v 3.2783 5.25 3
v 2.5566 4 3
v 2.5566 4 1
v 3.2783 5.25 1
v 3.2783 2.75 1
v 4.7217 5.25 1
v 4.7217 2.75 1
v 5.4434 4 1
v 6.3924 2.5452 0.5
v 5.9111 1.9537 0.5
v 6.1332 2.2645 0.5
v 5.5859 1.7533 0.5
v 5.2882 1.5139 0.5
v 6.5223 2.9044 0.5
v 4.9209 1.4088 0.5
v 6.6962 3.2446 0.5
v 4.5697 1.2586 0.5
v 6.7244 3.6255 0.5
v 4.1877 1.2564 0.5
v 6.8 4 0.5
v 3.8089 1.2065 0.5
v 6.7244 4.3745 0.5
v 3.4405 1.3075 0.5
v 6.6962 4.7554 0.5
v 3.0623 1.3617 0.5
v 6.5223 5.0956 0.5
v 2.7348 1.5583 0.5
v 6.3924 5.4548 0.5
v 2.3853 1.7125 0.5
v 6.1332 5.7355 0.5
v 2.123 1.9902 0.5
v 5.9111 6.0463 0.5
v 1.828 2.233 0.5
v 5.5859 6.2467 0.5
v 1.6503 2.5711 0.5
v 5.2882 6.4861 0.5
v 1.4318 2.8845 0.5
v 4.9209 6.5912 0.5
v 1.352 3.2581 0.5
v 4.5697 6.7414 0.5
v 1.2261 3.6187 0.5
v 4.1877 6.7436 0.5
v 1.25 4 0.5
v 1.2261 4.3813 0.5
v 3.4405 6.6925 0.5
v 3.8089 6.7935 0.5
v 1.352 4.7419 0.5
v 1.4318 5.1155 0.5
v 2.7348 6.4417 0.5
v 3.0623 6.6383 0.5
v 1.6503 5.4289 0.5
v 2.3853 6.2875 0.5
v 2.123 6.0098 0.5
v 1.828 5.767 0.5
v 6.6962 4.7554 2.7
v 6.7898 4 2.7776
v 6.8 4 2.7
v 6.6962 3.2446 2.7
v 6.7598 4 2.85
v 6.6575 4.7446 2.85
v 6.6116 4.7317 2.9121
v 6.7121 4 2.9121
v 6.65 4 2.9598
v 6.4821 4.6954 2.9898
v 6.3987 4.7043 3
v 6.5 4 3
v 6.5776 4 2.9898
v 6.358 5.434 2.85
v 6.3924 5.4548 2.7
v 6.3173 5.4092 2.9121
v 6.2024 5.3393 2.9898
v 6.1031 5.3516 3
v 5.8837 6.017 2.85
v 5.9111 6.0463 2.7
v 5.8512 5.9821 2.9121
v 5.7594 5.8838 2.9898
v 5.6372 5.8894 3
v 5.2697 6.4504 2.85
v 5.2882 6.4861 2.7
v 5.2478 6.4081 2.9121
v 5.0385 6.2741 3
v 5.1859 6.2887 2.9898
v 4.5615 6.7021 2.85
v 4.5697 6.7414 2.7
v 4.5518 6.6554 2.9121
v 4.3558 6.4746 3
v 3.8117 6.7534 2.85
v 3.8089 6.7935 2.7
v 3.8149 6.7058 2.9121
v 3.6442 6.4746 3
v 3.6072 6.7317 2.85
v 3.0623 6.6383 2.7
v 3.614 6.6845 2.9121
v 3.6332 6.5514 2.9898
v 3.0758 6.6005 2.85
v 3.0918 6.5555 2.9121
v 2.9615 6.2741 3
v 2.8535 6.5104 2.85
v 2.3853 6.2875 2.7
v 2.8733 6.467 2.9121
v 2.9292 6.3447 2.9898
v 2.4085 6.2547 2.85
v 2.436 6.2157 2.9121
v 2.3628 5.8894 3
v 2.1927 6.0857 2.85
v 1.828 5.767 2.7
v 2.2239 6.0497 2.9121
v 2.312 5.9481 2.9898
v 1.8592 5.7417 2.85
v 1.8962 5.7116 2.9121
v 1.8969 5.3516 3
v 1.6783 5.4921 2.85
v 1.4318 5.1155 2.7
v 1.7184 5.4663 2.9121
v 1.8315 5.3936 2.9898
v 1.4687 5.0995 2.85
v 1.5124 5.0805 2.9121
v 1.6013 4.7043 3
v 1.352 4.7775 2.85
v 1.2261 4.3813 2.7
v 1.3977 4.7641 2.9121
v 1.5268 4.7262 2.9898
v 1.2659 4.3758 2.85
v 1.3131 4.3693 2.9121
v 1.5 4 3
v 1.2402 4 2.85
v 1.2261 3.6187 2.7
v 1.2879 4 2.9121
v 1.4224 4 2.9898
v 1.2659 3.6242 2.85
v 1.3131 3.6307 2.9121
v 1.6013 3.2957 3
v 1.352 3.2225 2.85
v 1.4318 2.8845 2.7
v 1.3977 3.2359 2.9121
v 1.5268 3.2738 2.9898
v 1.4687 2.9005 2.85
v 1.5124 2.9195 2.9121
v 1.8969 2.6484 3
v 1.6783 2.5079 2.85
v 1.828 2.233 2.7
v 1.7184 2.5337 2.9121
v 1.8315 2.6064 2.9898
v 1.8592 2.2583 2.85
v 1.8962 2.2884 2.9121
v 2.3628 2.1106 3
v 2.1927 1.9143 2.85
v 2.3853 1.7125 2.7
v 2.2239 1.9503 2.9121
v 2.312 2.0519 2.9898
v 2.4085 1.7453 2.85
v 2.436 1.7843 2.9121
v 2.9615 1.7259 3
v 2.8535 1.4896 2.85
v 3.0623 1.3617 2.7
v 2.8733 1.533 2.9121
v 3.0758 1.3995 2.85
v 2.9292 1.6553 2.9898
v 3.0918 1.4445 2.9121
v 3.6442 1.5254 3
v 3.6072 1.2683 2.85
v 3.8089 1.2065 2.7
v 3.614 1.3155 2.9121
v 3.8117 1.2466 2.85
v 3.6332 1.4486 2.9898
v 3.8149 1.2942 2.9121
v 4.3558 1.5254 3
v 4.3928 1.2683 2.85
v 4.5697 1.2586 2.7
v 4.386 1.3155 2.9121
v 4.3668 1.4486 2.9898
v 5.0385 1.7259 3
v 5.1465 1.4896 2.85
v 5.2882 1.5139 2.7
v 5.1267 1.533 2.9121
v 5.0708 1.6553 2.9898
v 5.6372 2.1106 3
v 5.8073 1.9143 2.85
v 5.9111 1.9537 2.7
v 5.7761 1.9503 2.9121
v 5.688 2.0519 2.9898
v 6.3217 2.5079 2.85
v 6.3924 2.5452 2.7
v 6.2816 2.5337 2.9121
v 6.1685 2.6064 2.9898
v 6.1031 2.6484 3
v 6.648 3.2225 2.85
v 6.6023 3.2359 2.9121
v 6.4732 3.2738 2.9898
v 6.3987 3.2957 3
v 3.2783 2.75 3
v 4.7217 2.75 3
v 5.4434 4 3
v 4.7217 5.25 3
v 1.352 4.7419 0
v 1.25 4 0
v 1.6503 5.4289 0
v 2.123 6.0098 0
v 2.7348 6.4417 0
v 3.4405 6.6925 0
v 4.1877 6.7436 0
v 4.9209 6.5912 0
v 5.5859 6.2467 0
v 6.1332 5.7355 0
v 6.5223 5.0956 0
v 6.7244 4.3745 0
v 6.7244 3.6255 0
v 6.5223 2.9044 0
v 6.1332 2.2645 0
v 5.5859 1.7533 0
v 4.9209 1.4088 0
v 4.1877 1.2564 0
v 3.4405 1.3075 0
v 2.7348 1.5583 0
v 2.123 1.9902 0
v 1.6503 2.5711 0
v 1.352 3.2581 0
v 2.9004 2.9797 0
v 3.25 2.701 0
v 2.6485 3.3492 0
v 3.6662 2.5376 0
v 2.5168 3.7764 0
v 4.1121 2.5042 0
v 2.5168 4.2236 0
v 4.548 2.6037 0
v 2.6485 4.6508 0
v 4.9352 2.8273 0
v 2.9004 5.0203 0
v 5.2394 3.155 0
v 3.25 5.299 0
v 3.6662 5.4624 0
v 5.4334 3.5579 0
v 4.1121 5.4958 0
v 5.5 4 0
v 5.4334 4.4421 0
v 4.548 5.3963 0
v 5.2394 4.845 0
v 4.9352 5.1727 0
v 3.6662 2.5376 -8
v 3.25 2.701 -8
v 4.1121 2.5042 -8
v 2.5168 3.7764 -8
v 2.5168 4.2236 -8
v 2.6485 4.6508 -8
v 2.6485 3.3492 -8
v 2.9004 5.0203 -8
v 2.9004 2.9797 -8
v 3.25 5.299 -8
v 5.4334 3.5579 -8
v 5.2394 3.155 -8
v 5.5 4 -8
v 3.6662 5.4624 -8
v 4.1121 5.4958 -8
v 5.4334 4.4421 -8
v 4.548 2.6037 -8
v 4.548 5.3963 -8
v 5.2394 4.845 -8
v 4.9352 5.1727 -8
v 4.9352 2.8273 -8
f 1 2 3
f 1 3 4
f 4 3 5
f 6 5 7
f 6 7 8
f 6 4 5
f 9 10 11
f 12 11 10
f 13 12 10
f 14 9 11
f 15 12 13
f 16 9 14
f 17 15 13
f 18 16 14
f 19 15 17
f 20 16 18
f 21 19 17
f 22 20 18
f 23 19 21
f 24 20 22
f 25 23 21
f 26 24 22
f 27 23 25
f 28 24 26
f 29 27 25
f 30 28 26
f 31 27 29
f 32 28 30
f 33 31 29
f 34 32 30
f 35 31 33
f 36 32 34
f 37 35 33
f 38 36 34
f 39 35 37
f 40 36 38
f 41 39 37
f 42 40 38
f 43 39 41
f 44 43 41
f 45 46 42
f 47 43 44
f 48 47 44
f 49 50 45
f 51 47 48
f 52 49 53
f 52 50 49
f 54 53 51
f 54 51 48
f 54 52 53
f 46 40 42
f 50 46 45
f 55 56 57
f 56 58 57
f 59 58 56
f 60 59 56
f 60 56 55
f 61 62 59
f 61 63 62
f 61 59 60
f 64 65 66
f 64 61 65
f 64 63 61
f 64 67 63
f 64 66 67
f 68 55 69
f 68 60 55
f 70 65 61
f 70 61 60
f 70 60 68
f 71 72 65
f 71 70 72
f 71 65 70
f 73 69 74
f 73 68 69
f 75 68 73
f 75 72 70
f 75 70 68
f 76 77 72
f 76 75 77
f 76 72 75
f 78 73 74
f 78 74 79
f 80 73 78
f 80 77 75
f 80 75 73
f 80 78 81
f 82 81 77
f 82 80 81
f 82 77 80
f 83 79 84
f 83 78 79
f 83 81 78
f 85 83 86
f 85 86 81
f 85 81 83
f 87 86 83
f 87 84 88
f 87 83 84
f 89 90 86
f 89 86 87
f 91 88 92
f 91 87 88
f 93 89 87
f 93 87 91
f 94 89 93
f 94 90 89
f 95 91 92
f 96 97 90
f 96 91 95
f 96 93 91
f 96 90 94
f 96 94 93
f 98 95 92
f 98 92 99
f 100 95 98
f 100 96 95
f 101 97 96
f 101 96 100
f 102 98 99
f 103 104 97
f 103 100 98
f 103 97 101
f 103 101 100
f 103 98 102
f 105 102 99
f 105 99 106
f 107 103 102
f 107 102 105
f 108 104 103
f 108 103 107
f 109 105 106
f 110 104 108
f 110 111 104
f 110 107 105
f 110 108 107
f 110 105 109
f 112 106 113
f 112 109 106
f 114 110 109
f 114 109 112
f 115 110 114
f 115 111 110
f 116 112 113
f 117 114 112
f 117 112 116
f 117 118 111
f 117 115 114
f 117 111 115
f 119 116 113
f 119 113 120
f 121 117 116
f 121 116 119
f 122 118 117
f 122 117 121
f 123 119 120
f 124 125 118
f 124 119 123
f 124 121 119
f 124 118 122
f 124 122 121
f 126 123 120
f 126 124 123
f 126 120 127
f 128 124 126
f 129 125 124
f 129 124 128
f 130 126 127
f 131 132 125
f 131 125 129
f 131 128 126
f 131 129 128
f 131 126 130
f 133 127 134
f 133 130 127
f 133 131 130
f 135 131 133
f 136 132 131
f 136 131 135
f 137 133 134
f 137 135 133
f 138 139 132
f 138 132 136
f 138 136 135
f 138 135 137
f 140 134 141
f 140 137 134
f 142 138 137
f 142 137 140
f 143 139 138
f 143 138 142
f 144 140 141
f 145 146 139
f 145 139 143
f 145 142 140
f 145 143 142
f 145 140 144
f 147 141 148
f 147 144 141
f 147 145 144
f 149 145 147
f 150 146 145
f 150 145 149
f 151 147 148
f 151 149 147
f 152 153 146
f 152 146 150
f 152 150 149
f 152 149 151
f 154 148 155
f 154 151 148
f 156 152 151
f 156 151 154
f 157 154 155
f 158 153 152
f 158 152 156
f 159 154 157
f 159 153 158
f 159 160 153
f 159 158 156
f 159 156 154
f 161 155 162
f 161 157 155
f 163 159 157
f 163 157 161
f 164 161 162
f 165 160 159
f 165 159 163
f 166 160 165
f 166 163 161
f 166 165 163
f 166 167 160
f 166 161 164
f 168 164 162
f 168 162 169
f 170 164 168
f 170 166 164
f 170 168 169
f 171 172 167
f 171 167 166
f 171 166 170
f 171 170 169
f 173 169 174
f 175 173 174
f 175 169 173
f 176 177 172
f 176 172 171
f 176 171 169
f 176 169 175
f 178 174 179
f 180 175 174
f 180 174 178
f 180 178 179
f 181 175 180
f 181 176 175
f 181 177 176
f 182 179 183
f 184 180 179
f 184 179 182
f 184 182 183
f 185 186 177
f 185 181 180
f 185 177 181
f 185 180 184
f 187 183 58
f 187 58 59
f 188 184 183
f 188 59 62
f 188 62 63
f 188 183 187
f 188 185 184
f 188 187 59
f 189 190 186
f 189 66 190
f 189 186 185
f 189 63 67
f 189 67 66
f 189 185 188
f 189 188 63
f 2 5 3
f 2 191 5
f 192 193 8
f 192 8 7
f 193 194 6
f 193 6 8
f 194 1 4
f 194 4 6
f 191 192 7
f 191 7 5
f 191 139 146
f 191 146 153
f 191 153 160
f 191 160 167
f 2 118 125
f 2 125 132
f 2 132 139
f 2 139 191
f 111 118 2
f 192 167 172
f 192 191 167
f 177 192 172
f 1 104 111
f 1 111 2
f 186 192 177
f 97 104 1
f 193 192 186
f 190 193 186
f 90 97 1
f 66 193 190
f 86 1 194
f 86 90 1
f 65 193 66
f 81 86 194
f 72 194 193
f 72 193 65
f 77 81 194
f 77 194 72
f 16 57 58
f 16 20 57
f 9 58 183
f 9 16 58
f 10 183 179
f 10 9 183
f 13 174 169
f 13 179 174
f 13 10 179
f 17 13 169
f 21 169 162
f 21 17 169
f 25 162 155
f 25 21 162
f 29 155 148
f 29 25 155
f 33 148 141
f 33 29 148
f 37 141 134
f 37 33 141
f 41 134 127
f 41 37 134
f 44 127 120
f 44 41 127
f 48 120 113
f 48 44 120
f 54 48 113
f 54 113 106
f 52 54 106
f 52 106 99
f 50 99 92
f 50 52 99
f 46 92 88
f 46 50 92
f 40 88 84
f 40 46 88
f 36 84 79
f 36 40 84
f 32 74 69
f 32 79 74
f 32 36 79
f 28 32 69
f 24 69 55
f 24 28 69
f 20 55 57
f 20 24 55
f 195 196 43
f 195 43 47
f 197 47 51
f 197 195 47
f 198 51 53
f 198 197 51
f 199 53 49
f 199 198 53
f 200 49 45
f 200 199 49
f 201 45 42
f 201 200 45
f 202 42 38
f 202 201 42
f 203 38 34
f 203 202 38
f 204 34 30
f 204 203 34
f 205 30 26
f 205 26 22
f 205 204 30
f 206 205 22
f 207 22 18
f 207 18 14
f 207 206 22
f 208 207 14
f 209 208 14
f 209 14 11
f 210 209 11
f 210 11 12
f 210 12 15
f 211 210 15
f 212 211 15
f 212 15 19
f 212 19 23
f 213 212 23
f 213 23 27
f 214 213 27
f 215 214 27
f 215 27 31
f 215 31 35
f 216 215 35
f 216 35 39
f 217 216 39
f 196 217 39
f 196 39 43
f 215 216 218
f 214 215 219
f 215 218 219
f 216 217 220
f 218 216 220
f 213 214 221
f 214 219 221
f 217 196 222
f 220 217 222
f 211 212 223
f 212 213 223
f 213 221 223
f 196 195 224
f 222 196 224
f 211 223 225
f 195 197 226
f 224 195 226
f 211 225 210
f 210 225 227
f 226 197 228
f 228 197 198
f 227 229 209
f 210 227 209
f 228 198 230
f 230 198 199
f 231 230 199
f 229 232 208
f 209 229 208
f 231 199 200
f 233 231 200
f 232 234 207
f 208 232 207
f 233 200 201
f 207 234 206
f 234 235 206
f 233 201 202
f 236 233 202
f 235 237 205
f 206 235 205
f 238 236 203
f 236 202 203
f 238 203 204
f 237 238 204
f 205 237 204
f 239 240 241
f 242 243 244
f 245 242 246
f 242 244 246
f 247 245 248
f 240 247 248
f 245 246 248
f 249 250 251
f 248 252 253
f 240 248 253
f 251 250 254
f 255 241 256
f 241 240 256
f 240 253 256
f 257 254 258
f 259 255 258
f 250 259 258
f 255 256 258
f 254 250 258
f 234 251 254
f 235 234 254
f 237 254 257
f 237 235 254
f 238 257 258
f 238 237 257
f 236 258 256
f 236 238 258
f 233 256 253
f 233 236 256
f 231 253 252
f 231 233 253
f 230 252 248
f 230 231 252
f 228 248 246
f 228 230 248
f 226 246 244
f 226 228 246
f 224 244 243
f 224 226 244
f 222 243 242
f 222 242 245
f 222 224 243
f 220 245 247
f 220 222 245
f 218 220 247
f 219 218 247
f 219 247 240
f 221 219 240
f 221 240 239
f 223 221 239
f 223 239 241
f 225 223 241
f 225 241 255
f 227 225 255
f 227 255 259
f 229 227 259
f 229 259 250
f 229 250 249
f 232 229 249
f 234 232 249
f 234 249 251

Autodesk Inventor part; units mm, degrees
ref_plane "YZ Plane" through (0, 0, 0) normal (1, 0, 0) x (0, 1, 0)
ref_plane "XZ Plane" through (0, 0, 0) normal (0, 1, 0) x (-1, 0, 0)
ref_plane "XY Plane" through (0, 0, 0) normal (0, 0, 1) x (1, 0, 0)
sketch "Sketch1" plane through (0, 0, 0) normal (0, 0, 1) x (1, 0, 0)
  circle A0 centre (4, 4) radius 1.2 projected
  circle A1 centre (4, 4) radius 1.5
  point P0 (0, 0)
  dimension "d0" = 3
extrude "Extrusion1" add sketch "Sketch1" against normal blind 8 contours A0 | A1
sketch "Sketch2" plane through (4, 4, 0) normal (0, 0, 1) x (1, 0, 0)
  circle A0 centre (0, 0) radius 1.5 projected
  circle A1 centre (0, 0) radius 2.8
  point P0 (-4, -4)
  dimension "d3" = 5.6
extrude "Extrusion2" add sketch "Sketch2" along normal blind 3 contours A0 | A1
fillet "Fillet1" radius 0.3 1 edges at (1.2, 4, 3)
sketch "Sketch3" plane through (4, 4, 0) normal (0, 0, -1) x (-1, 0, 0)
  circle A0 centre (0, 0) radius 2.8 projected
  circle A1 centre (0, 0) radius 1.5 projected
  circle A2 centre (0, 0) radius 2.75
  point P0 (4, -4)
  dimension "d7" = 5.5
extrude "Extrusion3" cut sketch "Sketch3" against normal blind 0.5 contours A0
sketch "Sketch4" plane through (4, 4, 3) normal (0, 0, 1) x (1, 0, 0)
  circle A0 centre (0, 0) radius 2.5 projected
  line L0 (0.7217, 1.25) -> (1.4434, 0)
  line L1 (1.4434, 0) -> (0.7217, -1.25)
  line L2 (0.7217, -1.25) -> (-0.7217, -1.25)
  line L3 (-0.7217, -1.25) -> (-1.4434, 0)
  line L4 (-1.4434, 0) -> (-0.7217, 1.25)
  line L5 (-0.7217, 1.25) -> (0.7217, 1.25)
  point P0 (-4, -4)
  dimension "d10" = 2.5
extrude "Extrusion4" cut sketch "Sketch4" against normal blind 2 contours L0 L1 L2 L3 L4 L5
thread "Thread1" size "M3x0.5" class "6g" standard "ANSI Metric M Profile" full length
properties part number "m3 6" material "Steel"
